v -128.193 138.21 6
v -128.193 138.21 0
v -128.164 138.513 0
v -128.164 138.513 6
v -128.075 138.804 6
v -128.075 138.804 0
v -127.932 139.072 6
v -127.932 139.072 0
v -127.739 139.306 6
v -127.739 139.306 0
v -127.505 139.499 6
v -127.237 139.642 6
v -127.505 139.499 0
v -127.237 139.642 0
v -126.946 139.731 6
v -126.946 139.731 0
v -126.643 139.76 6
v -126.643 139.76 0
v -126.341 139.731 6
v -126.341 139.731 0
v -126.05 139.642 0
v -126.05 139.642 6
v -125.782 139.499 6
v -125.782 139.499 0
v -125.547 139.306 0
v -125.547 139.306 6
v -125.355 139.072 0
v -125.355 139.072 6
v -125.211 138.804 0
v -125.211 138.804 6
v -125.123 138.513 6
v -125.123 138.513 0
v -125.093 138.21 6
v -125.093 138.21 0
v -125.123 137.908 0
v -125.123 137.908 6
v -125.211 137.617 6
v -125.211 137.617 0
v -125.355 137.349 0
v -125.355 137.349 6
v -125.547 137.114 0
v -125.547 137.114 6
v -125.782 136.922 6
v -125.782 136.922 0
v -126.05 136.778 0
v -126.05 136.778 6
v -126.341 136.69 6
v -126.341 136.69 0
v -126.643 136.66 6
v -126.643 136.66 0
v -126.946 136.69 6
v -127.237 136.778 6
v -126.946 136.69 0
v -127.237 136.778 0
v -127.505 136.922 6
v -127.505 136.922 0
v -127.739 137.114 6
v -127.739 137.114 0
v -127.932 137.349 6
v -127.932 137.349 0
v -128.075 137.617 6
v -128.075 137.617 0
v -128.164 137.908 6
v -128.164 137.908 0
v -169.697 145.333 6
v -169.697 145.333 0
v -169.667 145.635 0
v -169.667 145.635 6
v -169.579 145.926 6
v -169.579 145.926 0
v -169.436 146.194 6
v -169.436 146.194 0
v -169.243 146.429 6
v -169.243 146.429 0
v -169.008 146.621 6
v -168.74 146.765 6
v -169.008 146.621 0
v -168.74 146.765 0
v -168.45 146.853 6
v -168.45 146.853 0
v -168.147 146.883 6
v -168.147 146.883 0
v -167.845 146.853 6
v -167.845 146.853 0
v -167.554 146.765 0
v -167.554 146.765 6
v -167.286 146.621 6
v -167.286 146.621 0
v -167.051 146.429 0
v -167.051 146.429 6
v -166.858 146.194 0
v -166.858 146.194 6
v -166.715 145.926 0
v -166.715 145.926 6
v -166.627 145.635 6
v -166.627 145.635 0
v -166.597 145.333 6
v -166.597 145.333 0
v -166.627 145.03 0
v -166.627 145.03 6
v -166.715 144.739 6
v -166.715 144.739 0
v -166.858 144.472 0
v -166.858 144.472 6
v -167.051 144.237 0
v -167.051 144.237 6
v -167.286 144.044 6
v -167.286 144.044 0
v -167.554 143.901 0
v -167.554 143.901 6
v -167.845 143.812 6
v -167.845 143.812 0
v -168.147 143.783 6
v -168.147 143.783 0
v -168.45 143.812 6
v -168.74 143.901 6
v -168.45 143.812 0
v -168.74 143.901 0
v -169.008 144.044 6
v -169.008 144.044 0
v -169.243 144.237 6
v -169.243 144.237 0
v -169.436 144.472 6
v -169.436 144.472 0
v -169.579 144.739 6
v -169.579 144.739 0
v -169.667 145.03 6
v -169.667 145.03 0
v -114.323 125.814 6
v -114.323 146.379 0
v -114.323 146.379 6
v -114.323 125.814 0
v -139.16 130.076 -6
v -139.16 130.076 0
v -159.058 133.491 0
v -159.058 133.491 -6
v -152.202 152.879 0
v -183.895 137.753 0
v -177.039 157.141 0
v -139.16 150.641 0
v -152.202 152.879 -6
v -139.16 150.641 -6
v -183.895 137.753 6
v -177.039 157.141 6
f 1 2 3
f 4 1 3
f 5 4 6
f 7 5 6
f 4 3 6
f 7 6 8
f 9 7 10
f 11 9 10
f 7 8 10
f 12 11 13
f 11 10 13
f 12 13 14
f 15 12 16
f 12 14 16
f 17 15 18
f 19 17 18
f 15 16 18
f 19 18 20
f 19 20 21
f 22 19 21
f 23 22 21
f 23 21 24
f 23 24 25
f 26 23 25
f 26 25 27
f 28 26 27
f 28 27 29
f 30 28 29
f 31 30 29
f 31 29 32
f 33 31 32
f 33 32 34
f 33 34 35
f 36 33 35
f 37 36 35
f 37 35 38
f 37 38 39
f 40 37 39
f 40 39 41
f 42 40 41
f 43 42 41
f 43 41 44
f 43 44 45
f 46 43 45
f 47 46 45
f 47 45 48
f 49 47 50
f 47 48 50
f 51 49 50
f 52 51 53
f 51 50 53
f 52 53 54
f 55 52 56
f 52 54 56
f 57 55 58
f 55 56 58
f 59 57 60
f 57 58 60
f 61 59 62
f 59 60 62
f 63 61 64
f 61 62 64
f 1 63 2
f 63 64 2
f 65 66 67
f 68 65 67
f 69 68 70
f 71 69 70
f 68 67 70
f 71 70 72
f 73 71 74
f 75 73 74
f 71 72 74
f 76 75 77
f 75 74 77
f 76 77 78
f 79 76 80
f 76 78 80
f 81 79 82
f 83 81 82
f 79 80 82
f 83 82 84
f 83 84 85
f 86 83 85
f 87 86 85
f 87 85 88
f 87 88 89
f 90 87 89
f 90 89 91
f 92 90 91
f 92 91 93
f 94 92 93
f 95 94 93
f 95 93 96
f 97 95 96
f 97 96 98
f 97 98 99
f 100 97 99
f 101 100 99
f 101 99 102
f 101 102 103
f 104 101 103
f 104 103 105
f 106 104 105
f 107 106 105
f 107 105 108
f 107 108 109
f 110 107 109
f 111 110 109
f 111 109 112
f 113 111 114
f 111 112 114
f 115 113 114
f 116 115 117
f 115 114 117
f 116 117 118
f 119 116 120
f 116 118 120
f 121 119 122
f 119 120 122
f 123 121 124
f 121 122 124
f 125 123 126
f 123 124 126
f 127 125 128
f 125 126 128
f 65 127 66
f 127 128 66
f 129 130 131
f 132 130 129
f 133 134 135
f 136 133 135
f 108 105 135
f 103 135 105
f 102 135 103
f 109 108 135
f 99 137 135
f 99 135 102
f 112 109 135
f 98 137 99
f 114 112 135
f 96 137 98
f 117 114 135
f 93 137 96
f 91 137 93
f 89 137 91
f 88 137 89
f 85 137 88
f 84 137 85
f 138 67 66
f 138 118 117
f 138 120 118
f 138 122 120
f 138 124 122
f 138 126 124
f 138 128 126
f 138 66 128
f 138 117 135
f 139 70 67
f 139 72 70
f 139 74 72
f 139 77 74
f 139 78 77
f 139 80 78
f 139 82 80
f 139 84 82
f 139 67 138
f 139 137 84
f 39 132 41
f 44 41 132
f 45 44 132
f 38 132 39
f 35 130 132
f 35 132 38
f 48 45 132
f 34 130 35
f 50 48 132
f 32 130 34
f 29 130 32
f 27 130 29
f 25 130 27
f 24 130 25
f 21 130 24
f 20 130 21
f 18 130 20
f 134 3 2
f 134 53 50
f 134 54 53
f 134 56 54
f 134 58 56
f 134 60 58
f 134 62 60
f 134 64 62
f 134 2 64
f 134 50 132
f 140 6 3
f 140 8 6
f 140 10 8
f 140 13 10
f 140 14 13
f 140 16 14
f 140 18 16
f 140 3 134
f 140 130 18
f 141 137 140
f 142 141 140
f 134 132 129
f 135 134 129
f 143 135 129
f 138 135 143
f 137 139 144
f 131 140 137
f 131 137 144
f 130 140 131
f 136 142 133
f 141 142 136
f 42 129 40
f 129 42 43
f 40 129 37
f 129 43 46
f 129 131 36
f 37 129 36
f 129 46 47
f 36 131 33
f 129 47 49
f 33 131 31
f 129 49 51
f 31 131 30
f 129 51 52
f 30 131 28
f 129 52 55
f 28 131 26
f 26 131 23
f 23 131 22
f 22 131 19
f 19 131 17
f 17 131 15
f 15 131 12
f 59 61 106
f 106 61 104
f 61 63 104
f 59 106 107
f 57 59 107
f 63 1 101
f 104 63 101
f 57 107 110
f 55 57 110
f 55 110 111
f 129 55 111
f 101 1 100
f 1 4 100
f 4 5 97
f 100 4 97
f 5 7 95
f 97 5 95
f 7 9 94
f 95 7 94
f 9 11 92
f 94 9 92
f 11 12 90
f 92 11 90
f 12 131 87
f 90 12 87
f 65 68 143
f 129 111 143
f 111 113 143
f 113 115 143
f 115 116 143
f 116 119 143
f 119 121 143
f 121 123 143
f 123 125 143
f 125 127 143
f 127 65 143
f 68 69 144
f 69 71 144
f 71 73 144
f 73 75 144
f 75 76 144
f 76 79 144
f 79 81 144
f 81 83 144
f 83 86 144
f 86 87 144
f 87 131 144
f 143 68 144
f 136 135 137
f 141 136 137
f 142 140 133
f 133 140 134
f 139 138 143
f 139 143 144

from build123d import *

# Parameters (mm, degrees)
EXTRUDE_1_DEPTH     = 6
EXTRUDE_2_DEPTH     = 6
SKETCH_3_R          = 1.55
CUT_EXTRUDE_1_DEPTH = 7


with BuildPart() as part:
    # Эскиз1 → Бобышка-Вытянуть1 (new body)
    with BuildSketch(Plane.XY):
        Polygon((-114.323496858, 125.813994573), (-183.895105895, 137.75282099), (-177.039061357, 157.140809371), (-114.323496858, 146.378513535), align=None)
    extrude(amount=EXTRUDE_1_DEPTH)

    # Эскиз2 → Бобышка-Вытянуть2 (add)
    with BuildSketch(Plane(origin=(0, 0, 0), x_dir=(-1, 0, 0), z_dir=(0, 0, -1))):
        Polygon((139.160448137, 150.64065515), (139.160448137, 130.076136187), (159.058154615, 133.490679376), (152.202110077, 152.878667757), align=None)
    extrude(amount=EXTRUDE_2_DEPTH)

    # Эскиз3 → Вырез-Вытянуть1 (cut, through all)
    with BuildSketch(Plane(origin=(0, 0, 0), x_dir=(-1, 0, 0), z_dir=(0, 0, -1))):
        with Locations((126.643413167, 138.210411601)):
            Circle(SKETCH_3_R)
        with Locations((168.147167316, 145.332657634)):
            Circle(SKETCH_3_R)
    extrude(amount=-CUT_EXTRUDE_1_DEPTH, mode=Mode.SUBTRACT)


solid = part.part
